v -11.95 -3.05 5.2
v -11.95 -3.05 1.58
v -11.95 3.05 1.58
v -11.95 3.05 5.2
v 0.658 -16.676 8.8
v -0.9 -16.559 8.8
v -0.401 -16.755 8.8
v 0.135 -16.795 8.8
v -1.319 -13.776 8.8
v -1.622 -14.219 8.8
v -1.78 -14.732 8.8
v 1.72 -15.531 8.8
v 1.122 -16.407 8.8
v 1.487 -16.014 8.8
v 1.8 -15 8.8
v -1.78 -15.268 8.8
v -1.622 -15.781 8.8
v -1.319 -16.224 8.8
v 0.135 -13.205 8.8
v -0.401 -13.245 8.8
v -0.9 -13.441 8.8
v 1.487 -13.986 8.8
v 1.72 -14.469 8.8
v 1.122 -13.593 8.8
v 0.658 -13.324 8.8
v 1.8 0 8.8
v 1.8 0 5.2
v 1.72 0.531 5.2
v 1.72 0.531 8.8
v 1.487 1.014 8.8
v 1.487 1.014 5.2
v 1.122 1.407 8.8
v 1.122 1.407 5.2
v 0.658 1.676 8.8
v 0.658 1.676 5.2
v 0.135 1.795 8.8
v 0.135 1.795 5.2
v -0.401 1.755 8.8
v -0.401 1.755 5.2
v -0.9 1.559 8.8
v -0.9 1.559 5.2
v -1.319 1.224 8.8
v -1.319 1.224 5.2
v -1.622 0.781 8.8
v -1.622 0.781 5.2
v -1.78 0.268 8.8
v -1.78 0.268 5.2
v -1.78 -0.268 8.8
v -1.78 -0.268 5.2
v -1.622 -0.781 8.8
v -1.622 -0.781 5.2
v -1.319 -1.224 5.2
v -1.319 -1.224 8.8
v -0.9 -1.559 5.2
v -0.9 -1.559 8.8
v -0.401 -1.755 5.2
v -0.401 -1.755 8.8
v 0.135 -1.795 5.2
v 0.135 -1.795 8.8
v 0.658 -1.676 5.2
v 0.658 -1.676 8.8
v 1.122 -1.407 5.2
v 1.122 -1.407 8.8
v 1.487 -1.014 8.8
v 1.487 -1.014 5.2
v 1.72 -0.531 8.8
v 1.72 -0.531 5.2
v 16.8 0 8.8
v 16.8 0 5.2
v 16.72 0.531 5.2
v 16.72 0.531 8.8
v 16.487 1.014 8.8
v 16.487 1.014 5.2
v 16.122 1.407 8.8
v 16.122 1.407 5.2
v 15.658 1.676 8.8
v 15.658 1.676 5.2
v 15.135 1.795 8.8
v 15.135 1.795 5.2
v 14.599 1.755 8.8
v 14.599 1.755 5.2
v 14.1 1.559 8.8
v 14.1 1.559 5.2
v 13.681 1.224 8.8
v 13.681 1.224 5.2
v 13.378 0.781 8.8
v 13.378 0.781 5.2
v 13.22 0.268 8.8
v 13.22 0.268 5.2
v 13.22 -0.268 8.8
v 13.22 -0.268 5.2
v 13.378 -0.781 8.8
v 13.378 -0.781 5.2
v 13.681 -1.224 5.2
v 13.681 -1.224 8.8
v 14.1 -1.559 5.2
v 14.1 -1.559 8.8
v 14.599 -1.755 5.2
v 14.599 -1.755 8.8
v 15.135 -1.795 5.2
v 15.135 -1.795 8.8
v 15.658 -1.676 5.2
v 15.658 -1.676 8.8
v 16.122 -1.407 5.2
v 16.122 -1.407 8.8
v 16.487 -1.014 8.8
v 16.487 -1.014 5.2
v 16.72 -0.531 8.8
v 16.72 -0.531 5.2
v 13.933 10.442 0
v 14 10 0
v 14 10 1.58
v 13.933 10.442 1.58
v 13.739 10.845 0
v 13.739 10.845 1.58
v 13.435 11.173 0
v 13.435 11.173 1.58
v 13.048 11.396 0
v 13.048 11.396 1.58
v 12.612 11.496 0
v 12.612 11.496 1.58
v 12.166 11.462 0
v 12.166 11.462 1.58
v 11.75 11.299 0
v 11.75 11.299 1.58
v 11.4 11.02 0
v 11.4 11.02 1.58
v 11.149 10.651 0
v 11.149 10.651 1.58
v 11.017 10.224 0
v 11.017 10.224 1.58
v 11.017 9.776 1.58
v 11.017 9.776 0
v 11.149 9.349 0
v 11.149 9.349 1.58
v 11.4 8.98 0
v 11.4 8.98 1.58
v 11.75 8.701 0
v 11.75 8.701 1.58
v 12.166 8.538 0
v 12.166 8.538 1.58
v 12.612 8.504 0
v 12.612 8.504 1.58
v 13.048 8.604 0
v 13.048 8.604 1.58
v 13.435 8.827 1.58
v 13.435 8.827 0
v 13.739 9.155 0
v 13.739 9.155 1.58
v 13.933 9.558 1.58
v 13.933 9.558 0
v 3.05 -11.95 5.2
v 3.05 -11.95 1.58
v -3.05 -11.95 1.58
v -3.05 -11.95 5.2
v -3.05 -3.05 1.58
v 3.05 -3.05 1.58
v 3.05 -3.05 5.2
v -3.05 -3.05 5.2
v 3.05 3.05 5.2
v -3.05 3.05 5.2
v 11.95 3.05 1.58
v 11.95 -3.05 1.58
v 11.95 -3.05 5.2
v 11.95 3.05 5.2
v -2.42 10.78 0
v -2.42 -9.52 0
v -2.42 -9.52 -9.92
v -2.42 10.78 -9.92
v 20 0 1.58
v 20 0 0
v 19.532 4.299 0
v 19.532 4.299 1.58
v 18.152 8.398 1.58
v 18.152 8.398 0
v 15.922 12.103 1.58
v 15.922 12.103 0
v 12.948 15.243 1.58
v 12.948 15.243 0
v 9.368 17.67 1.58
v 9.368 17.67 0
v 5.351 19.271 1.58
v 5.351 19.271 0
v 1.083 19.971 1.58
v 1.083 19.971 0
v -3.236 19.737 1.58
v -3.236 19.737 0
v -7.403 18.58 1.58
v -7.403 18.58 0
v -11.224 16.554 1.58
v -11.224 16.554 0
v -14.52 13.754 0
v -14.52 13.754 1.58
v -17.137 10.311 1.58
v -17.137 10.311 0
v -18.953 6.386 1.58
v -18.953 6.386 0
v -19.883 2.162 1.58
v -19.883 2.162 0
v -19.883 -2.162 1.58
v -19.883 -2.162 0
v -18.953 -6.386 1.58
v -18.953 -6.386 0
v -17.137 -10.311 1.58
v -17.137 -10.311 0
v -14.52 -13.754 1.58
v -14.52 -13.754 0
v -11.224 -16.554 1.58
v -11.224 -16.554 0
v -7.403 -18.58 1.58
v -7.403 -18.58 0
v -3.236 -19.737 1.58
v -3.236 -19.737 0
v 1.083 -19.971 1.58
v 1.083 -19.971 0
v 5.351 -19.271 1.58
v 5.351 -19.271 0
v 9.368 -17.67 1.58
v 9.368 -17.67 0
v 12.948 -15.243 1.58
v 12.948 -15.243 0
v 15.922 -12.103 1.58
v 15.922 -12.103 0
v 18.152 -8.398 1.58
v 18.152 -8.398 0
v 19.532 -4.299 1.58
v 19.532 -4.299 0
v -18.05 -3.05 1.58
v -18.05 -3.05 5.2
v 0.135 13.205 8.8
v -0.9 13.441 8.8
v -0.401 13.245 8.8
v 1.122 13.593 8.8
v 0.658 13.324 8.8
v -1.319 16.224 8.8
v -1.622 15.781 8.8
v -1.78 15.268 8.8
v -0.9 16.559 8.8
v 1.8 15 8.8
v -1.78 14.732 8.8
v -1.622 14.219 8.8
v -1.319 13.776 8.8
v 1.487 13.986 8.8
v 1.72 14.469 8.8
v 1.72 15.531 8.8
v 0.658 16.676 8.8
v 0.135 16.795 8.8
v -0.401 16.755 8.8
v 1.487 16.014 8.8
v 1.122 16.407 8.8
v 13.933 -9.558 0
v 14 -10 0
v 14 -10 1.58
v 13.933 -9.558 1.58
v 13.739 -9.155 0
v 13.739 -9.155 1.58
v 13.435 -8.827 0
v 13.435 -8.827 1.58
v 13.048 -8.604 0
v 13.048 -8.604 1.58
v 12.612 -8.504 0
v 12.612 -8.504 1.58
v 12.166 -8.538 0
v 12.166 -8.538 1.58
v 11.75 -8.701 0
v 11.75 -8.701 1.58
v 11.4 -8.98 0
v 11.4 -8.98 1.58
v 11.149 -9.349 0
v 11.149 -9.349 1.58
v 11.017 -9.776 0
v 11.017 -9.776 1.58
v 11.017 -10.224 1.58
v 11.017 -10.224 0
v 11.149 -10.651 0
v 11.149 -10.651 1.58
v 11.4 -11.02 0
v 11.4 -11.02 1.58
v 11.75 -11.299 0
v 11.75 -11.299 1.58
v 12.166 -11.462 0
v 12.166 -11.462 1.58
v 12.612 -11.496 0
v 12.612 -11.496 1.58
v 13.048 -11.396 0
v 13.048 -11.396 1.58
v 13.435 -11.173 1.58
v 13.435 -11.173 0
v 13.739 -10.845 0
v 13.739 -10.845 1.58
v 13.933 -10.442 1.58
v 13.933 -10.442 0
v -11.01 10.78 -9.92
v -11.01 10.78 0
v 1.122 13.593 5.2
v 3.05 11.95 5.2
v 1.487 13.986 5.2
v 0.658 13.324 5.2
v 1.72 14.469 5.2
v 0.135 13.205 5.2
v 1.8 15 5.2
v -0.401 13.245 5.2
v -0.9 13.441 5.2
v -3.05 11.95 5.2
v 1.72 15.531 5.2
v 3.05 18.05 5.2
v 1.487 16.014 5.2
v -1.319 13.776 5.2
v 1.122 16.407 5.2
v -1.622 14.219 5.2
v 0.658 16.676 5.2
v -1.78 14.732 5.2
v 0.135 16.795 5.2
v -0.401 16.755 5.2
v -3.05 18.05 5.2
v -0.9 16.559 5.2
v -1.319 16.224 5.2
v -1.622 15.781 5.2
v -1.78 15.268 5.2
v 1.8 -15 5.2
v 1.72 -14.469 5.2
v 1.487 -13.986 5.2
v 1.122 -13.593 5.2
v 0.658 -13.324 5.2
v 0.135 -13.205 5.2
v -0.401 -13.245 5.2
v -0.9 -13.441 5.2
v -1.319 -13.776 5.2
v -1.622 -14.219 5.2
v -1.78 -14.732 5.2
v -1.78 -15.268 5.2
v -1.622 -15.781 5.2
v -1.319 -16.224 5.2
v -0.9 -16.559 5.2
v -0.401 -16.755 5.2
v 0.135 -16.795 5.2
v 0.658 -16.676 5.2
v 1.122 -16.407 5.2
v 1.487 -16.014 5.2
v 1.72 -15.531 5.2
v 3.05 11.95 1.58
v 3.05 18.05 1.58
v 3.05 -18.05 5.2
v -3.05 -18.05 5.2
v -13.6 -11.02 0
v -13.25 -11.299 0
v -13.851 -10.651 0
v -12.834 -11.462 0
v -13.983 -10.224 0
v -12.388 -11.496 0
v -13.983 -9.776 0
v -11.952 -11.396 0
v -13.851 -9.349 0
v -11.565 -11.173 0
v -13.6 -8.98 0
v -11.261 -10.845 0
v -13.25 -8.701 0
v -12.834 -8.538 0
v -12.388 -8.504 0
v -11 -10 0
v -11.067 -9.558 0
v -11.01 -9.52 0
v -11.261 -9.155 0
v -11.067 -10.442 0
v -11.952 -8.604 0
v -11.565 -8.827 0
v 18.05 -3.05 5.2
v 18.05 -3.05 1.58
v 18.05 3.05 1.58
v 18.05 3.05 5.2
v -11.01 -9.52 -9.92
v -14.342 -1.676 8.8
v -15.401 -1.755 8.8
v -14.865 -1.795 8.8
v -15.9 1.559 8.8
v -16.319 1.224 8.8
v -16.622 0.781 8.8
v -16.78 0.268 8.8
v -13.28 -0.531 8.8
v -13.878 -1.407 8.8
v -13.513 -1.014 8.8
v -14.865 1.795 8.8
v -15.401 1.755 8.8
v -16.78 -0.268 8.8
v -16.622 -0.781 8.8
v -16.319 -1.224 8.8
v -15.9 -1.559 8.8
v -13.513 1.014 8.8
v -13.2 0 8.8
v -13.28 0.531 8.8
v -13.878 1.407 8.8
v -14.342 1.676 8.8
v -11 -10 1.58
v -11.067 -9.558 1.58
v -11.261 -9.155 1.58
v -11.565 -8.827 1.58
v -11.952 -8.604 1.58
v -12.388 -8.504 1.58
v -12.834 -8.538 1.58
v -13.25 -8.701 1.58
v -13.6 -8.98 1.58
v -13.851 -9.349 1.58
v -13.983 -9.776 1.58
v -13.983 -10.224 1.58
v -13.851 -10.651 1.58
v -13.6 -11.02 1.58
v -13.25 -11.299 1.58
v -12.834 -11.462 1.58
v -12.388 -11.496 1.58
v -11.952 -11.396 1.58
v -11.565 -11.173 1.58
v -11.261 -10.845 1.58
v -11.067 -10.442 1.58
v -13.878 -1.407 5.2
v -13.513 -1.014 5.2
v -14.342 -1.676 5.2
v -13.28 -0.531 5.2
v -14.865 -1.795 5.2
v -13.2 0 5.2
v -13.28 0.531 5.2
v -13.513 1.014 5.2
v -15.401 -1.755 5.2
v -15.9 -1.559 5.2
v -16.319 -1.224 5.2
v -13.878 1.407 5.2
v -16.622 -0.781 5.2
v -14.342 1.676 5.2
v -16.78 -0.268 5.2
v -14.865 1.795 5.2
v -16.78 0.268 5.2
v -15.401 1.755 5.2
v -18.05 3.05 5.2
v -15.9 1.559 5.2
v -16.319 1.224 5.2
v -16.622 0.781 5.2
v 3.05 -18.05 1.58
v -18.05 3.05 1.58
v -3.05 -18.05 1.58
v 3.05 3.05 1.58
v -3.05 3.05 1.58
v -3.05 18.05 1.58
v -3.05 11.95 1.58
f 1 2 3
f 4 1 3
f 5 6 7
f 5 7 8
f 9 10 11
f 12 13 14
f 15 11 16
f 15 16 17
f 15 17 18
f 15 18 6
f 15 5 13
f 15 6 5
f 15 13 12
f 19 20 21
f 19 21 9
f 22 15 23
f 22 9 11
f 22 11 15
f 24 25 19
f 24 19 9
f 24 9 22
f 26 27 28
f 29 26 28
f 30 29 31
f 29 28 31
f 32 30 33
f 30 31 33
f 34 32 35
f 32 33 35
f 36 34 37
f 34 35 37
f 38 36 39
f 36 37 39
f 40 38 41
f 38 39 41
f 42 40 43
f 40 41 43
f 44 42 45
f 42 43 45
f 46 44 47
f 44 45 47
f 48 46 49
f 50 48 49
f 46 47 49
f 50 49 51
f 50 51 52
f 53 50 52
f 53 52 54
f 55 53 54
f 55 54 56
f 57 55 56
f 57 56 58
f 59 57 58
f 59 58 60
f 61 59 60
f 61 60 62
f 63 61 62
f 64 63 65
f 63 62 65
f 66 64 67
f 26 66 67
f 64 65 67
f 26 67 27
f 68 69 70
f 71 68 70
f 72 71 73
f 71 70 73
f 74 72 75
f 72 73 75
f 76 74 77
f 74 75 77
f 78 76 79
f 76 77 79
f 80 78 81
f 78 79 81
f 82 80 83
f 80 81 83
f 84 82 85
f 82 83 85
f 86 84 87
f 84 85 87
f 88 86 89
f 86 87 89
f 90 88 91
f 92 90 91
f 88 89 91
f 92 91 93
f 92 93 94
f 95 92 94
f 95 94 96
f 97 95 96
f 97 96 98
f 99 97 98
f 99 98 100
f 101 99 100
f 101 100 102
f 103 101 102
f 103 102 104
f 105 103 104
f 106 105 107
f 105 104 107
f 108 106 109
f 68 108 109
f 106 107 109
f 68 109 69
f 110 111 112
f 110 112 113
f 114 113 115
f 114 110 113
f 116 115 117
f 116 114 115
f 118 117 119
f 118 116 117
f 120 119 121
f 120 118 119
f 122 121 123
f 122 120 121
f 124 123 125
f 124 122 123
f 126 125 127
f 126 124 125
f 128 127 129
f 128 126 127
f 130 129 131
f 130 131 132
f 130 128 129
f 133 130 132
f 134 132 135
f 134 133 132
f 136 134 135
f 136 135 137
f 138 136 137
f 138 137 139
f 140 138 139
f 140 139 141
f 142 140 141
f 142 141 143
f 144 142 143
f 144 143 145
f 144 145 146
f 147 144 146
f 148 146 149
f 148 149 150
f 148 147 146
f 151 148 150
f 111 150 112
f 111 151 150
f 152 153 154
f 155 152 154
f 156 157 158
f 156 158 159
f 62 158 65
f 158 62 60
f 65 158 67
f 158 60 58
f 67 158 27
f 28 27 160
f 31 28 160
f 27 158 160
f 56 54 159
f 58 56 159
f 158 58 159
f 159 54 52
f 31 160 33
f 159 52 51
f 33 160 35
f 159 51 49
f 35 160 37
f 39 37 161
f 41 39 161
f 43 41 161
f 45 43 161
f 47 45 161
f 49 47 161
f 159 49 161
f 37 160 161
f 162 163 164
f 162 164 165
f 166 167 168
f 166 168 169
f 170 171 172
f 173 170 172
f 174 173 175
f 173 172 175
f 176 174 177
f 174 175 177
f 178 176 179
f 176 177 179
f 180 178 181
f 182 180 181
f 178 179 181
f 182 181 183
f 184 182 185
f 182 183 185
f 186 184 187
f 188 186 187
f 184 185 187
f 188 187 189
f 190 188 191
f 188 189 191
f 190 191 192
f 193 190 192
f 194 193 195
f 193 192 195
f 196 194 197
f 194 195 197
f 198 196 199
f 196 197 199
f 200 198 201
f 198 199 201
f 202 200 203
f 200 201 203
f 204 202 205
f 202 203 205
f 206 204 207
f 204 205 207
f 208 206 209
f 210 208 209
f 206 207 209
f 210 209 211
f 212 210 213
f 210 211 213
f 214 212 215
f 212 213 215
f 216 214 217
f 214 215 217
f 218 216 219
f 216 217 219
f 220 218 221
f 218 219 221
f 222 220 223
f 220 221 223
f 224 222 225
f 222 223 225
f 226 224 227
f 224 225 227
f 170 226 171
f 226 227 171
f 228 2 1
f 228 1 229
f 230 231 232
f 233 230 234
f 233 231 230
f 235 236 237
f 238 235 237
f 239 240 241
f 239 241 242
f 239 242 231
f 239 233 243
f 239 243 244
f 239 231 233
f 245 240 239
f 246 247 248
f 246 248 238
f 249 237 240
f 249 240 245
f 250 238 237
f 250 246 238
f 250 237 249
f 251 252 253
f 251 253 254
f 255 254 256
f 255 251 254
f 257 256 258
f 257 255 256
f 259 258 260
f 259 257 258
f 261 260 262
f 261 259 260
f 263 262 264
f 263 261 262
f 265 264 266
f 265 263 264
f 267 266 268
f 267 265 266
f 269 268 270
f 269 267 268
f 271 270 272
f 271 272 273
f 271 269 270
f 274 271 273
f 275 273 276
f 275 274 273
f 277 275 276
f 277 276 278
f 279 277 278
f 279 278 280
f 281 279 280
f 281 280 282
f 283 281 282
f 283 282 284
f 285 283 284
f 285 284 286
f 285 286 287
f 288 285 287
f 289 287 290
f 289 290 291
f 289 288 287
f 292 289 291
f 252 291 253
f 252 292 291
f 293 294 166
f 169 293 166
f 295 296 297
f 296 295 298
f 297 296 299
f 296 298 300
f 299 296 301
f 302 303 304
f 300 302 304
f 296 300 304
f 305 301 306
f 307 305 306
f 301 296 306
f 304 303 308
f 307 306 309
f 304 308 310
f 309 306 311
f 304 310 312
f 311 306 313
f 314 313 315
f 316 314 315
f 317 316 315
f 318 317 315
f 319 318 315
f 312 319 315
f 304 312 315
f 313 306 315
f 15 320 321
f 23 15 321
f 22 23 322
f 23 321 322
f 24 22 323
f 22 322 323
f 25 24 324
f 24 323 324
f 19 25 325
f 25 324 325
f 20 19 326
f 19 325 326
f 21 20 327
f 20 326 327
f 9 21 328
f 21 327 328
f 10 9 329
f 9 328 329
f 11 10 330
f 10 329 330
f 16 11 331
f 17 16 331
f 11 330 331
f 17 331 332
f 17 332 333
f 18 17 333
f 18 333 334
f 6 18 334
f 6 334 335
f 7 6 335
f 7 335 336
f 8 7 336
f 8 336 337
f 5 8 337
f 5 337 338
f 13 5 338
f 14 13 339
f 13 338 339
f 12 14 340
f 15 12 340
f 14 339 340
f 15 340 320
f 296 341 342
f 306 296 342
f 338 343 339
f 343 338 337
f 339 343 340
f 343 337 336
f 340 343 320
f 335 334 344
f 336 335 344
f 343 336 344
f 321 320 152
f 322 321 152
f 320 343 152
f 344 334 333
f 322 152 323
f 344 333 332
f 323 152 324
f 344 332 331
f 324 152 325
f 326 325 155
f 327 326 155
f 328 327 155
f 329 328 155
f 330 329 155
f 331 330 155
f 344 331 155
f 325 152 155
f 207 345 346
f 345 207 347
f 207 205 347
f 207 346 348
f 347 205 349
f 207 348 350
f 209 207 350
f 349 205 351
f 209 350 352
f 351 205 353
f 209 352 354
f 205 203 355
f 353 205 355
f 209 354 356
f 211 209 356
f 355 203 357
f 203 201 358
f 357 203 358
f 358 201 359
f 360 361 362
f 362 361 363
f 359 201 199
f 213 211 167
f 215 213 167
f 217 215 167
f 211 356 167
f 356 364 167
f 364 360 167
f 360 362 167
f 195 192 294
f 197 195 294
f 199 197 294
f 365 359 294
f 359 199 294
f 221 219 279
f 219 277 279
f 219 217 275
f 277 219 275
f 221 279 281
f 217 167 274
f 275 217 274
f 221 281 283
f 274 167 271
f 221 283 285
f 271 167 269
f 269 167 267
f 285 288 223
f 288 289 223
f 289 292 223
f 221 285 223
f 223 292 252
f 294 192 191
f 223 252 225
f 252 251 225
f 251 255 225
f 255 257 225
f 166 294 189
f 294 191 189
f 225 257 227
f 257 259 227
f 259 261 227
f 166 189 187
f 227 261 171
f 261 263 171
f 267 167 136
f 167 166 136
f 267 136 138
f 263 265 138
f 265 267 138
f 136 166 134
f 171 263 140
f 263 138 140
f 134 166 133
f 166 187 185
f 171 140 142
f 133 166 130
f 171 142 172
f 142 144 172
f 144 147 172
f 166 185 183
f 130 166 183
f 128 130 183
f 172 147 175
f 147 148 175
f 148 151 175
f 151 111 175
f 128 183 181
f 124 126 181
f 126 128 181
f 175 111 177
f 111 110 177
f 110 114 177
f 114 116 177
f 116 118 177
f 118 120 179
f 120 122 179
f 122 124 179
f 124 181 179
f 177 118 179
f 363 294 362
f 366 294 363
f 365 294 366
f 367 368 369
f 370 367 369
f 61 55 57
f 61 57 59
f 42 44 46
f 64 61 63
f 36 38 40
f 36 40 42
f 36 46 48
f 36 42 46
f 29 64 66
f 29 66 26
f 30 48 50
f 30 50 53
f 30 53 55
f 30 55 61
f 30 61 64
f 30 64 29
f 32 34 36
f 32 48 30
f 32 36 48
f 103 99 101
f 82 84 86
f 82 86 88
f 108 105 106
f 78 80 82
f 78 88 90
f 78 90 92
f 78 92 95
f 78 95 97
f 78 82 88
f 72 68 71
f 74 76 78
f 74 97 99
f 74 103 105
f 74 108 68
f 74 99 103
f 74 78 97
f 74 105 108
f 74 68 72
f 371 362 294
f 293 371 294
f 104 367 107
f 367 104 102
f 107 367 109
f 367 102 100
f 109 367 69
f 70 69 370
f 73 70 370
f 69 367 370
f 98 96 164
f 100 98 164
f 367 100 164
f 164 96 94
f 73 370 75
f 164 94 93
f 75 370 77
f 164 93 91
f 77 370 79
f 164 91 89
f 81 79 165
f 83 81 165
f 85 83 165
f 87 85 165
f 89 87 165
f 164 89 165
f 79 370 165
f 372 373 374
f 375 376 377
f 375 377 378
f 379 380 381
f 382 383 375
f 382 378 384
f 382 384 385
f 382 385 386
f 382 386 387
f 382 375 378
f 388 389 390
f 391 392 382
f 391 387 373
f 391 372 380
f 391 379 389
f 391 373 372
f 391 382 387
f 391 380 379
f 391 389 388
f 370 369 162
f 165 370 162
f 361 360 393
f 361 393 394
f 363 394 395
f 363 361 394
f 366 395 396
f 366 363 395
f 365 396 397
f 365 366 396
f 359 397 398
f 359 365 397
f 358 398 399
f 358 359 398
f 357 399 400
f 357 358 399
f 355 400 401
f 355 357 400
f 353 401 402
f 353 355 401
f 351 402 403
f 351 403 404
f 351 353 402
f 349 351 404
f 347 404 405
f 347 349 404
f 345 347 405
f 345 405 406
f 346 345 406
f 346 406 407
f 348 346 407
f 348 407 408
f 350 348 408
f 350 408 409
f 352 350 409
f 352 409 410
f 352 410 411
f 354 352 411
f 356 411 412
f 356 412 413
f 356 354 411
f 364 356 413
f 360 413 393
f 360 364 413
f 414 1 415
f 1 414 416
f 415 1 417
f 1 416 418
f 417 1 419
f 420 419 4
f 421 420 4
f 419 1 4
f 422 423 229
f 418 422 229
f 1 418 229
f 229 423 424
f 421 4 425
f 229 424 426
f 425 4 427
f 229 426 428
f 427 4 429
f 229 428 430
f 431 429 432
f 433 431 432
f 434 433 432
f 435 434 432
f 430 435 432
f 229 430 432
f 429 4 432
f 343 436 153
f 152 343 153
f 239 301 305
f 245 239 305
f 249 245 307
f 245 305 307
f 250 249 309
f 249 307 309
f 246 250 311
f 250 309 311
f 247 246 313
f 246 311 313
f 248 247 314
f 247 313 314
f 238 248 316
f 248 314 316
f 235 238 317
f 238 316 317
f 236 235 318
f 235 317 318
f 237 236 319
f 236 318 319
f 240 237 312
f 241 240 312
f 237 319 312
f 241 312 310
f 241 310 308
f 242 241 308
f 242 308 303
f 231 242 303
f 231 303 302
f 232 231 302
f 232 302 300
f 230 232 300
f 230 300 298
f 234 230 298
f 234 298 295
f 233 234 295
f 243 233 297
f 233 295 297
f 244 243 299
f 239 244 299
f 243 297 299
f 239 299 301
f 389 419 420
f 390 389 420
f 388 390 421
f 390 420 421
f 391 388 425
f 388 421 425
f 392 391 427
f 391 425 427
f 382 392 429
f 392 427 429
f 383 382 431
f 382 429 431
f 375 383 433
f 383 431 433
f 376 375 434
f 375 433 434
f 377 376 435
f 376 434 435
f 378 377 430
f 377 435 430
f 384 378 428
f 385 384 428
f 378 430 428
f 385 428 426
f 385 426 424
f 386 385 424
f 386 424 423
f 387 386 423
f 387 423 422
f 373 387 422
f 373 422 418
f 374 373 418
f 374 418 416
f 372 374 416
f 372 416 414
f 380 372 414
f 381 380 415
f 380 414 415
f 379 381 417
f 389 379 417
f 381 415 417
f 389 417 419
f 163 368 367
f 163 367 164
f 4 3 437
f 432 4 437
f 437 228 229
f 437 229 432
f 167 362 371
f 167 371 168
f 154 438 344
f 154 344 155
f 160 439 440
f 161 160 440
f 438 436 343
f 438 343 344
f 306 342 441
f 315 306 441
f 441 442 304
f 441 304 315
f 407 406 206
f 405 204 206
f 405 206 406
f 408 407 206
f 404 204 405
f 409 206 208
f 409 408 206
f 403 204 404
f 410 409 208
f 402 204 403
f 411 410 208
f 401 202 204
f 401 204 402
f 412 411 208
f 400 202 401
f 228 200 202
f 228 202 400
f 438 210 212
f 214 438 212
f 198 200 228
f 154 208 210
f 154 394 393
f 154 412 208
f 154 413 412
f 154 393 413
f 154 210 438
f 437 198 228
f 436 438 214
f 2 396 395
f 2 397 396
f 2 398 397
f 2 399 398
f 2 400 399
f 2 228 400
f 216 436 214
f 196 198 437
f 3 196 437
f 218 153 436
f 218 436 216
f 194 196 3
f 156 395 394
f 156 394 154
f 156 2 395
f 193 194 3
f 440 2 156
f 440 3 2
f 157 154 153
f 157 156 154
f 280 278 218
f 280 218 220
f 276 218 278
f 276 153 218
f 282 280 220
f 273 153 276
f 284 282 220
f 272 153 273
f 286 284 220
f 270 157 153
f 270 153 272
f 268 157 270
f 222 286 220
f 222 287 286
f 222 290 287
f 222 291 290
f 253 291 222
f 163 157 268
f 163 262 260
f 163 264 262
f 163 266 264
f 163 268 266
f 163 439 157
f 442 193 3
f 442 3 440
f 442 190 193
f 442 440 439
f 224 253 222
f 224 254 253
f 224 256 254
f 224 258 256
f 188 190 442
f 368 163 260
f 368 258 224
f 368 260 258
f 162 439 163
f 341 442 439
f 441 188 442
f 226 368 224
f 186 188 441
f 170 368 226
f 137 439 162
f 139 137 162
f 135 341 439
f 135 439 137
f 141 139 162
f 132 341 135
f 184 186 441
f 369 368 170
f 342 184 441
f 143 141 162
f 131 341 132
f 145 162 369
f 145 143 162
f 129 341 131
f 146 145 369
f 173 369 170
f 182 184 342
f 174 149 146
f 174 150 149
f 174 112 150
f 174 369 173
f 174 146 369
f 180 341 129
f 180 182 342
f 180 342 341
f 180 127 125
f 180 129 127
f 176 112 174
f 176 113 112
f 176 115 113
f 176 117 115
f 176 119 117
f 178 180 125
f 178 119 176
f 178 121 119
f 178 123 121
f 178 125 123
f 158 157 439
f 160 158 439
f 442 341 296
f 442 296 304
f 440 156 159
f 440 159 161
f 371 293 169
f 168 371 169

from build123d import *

# Parameters (mm, degrees)
ESQUISSE3_R        = 20
ESQUISSE3_R_2      = 1.5
ESQUISSE3_W        = 6.1
ESQUISSE3_H        = 6.1
BOSS_EXTRU_2_DEPTH = 1.58
ESQUISSE5_W        = 6.1
ESQUISSE5_H        = 6.1
BOSS_EXTRU_3_DEPTH = 5.2
ESQUISSE6_R        = 1.8
BOSS_EXTRU_4_DEPTH = 3.6
ESQUISSE7_W        = 8.59
ESQUISSE7_H        = 20.3
BOSS_EXTRU_5_DEPTH = 9.92


with BuildPart() as part:
    # Esquisse3 → Boss.-Extru.2 (new body)
    with BuildSketch(Plane.XY):
        Circle(ESQUISSE3_R)
        with Locations((-12.5, -10)):
            Circle(ESQUISSE3_R_2, mode=Mode.SUBTRACT)
        with Locations((12.5, -10)):
            Circle(ESQUISSE3_R_2, mode=Mode.SUBTRACT)
        with Locations((12.5, 10)):
            Circle(ESQUISSE3_R_2, mode=Mode.SUBTRACT)
        with Locations((-15, 0)):
            Rectangle(ESQUISSE3_W, ESQUISSE3_H, mode=Mode.SUBTRACT)
        with Locations((15, 0)):
            Rectangle(ESQUISSE3_W, ESQUISSE3_H, mode=Mode.SUBTRACT)
        with Locations((0, 15)):
            Rectangle(ESQUISSE3_W, ESQUISSE3_H, mode=Mode.SUBTRACT)
        with Locations((0, -15)):
            Rectangle(ESQUISSE3_W, ESQUISSE3_H, mode=Mode.SUBTRACT)
        Rectangle(ESQUISSE3_W, ESQUISSE3_H, mode=Mode.SUBTRACT)
    extrude(amount=BOSS_EXTRU_2_DEPTH)

    # Esquisse5 → Boss.-Extru.3 (add)
    with BuildSketch(Plane(origin=(0, 0, 0), x_dir=(-1, 0, 0), z_dir=(0, 0, -1))):
        with Locations((0, 15)):
            Rectangle(ESQUISSE5_W, ESQUISSE5_H)
        with Locations((-15, 0)):
            Rectangle(ESQUISSE5_W, ESQUISSE5_H)
        with Locations((15, 0)):
            Rectangle(ESQUISSE5_W, ESQUISSE5_H)
        Rectangle(ESQUISSE5_W, ESQUISSE5_H)
        with Locations((0, -15)):
            Rectangle(ESQUISSE5_W, ESQUISSE5_H)
    extrude(amount=-BOSS_EXTRU_3_DEPTH)

    # Esquisse6 → Boss.-Extru.4 (add)
    with BuildSketch(Plane.XY.offset(5.2)):
        Circle(ESQUISSE6_R)
        with Locations((0, 15)):
            Circle(ESQUISSE6_R)
        with Locations((15, 0)):
            Circle(ESQUISSE6_R)
        with Locations((0, -15)):
            Circle(ESQUISSE6_R)
        with Locations((-15, 0)):
            Circle(ESQUISSE6_R)
    extrude(amount=BOSS_EXTRU_4_DEPTH)

    # Esquisse7 → Boss.-Extru.5 (add)
    with BuildSketch(Plane.XY):
        with Locations((-6.715, 0.63)):
            Rectangle(ESQUISSE7_W, ESQUISSE7_H)
    extrude(amount=-BOSS_EXTRU_5_DEPTH)


solid = part.part
